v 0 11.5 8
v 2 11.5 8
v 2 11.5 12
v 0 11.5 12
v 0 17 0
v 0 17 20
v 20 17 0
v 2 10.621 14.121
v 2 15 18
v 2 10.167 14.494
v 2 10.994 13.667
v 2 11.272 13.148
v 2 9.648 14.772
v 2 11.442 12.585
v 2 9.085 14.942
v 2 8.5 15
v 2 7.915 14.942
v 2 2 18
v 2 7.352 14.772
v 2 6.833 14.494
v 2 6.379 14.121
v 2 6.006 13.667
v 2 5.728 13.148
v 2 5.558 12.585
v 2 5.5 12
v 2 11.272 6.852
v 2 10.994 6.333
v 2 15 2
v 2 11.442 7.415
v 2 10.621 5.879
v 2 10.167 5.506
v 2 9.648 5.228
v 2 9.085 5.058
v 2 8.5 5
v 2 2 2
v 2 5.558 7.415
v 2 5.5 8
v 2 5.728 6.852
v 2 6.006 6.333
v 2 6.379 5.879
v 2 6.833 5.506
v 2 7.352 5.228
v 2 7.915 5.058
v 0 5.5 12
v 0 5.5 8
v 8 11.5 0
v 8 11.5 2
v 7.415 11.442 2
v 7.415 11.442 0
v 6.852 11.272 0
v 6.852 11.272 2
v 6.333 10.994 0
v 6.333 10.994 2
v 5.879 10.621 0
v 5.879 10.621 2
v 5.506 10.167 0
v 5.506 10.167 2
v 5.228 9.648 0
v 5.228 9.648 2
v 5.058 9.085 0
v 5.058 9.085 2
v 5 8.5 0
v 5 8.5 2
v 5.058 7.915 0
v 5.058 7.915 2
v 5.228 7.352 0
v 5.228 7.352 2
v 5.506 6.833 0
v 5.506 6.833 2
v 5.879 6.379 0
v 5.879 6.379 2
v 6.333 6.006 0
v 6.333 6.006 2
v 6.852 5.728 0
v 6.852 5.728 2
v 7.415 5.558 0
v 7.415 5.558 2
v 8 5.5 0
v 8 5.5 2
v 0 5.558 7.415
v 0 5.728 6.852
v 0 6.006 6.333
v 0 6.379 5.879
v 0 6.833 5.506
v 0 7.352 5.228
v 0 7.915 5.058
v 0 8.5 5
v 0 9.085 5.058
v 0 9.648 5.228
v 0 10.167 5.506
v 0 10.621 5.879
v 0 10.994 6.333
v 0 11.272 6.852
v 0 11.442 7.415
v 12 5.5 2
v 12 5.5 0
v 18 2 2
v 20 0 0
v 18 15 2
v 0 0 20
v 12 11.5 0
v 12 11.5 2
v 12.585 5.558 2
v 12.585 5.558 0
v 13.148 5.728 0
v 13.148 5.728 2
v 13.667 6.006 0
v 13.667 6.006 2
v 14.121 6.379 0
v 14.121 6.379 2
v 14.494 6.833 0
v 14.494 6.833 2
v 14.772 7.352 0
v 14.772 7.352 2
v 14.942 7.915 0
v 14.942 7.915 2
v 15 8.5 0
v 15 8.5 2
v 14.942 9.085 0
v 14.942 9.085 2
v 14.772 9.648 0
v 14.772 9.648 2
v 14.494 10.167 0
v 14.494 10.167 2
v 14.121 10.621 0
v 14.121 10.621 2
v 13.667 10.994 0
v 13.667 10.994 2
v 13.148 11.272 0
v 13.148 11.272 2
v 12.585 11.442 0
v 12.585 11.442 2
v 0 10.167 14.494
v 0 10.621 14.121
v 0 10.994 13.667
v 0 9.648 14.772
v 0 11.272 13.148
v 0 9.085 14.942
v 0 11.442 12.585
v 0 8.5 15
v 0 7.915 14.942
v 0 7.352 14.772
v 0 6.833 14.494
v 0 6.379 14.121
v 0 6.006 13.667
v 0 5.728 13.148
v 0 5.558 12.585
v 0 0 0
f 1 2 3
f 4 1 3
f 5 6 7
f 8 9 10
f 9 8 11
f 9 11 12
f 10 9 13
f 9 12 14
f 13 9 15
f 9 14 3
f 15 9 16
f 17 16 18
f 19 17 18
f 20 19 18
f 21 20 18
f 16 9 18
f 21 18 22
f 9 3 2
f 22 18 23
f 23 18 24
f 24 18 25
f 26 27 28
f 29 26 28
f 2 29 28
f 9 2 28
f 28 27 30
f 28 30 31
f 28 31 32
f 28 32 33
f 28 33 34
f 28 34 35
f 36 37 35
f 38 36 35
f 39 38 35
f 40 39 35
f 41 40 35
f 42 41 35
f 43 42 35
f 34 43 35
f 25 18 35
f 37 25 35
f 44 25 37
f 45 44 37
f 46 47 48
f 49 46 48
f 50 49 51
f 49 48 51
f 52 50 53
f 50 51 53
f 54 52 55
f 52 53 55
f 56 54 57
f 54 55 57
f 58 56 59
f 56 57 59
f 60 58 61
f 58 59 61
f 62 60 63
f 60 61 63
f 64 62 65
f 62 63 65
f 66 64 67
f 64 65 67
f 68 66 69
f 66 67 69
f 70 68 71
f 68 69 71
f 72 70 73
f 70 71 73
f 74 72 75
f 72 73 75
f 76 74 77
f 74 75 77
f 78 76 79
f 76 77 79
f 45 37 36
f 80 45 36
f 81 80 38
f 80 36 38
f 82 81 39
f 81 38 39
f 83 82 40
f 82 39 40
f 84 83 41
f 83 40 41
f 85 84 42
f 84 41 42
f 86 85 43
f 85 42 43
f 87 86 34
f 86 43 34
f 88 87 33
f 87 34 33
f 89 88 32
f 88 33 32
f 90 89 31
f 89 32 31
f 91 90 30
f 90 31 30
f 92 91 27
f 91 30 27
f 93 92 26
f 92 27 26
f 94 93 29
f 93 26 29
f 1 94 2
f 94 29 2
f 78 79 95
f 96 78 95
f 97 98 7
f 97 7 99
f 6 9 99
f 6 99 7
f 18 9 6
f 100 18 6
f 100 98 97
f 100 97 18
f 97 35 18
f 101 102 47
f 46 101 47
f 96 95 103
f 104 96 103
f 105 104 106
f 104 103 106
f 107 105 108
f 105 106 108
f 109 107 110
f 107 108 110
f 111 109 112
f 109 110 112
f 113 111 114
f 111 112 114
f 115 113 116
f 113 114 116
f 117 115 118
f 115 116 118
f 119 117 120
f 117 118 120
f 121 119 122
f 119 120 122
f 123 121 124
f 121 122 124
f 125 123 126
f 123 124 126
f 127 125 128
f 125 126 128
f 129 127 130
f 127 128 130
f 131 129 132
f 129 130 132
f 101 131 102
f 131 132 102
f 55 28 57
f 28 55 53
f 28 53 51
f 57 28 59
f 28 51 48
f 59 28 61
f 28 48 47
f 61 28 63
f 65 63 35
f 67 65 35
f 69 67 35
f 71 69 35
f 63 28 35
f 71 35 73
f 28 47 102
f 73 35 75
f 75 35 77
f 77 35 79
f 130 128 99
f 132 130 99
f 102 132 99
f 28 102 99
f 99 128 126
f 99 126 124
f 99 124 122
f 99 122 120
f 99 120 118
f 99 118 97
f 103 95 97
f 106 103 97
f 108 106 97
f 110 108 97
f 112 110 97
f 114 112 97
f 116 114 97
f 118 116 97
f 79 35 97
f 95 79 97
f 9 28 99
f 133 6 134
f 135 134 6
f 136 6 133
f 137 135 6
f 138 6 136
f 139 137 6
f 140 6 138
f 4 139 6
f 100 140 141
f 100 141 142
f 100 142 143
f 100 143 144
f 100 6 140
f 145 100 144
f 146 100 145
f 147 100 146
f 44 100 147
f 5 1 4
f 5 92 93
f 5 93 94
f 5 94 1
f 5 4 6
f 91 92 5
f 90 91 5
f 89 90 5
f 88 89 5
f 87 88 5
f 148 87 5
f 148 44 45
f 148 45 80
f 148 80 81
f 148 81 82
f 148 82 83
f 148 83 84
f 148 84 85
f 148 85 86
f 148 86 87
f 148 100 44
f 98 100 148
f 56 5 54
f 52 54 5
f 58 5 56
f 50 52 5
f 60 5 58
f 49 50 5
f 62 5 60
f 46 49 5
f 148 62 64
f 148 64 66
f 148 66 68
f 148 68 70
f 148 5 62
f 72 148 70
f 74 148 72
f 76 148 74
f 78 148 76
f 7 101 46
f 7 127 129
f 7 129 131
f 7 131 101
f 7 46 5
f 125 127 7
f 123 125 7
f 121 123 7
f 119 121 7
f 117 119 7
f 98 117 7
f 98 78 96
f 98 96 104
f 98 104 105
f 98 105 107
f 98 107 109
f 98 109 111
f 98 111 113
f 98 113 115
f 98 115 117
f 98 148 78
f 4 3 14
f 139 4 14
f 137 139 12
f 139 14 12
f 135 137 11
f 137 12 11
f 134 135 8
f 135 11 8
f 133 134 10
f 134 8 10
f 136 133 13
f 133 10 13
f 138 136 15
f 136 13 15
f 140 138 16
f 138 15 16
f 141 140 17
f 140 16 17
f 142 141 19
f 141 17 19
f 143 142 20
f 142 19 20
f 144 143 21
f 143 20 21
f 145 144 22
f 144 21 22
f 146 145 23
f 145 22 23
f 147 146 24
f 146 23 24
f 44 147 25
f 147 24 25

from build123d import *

# Parameters (mm, degrees)
F1_DEPTH = 17
F4_DEPTH = 13
F6_DEPTH = 2.001
F8_DEPTH = 2.001


with BuildPart() as f1:
    # F0 (on Front) → F1 (new body)
    with BuildSketch(Plane.XZ):
        Polygon((0, 20), (0, 0), (20, 0), (18, 2), (2, 2), (2, 18), align=None)
        Polygon((18, 2), (2, 18), (2, 2), align=None)
    extrude(amount=-F1_DEPTH)

    # F3 (on offset) → F4 (cut)
    with BuildSketch(Plane.XZ.offset(-2)):
        Polygon((2, 2), (18, 2), (2, 18), align=None)
    extrude(amount=-F4_DEPTH, mode=Mode.SUBTRACT)

    # F5 (on face) → F6 (cut, through all)
    with BuildSketch(Plane.YZ.offset(2)):
        with BuildLine():
            ThreePointArc((11.5, 12), (8.5, 15), (5.5, 12))
            Line((5.5, 12), (5.5, 8))
            ThreePointArc((5.5, 8), (8.5, 5), (11.5, 8))
            Line((11.5, 8), (11.5, 12))
        make_face()
    extrude(amount=-F6_DEPTH, mode=Mode.SUBTRACT)

    # F7 (on face) → F8 (cut, through all)
    with BuildSketch(Plane.XY.offset(2)):
        with BuildLine():
            ThreePointArc((8, 11.5), (5, 8.5), (8, 5.5))
            Line((8, 5.5), (12, 5.5))
            ThreePointArc((12, 5.5), (15, 8.5), (12, 11.5))
            Line((12, 11.5), (8, 11.5))
        make_face()
    extrude(amount=-F8_DEPTH, mode=Mode.SUBTRACT)


solid = f1.part
